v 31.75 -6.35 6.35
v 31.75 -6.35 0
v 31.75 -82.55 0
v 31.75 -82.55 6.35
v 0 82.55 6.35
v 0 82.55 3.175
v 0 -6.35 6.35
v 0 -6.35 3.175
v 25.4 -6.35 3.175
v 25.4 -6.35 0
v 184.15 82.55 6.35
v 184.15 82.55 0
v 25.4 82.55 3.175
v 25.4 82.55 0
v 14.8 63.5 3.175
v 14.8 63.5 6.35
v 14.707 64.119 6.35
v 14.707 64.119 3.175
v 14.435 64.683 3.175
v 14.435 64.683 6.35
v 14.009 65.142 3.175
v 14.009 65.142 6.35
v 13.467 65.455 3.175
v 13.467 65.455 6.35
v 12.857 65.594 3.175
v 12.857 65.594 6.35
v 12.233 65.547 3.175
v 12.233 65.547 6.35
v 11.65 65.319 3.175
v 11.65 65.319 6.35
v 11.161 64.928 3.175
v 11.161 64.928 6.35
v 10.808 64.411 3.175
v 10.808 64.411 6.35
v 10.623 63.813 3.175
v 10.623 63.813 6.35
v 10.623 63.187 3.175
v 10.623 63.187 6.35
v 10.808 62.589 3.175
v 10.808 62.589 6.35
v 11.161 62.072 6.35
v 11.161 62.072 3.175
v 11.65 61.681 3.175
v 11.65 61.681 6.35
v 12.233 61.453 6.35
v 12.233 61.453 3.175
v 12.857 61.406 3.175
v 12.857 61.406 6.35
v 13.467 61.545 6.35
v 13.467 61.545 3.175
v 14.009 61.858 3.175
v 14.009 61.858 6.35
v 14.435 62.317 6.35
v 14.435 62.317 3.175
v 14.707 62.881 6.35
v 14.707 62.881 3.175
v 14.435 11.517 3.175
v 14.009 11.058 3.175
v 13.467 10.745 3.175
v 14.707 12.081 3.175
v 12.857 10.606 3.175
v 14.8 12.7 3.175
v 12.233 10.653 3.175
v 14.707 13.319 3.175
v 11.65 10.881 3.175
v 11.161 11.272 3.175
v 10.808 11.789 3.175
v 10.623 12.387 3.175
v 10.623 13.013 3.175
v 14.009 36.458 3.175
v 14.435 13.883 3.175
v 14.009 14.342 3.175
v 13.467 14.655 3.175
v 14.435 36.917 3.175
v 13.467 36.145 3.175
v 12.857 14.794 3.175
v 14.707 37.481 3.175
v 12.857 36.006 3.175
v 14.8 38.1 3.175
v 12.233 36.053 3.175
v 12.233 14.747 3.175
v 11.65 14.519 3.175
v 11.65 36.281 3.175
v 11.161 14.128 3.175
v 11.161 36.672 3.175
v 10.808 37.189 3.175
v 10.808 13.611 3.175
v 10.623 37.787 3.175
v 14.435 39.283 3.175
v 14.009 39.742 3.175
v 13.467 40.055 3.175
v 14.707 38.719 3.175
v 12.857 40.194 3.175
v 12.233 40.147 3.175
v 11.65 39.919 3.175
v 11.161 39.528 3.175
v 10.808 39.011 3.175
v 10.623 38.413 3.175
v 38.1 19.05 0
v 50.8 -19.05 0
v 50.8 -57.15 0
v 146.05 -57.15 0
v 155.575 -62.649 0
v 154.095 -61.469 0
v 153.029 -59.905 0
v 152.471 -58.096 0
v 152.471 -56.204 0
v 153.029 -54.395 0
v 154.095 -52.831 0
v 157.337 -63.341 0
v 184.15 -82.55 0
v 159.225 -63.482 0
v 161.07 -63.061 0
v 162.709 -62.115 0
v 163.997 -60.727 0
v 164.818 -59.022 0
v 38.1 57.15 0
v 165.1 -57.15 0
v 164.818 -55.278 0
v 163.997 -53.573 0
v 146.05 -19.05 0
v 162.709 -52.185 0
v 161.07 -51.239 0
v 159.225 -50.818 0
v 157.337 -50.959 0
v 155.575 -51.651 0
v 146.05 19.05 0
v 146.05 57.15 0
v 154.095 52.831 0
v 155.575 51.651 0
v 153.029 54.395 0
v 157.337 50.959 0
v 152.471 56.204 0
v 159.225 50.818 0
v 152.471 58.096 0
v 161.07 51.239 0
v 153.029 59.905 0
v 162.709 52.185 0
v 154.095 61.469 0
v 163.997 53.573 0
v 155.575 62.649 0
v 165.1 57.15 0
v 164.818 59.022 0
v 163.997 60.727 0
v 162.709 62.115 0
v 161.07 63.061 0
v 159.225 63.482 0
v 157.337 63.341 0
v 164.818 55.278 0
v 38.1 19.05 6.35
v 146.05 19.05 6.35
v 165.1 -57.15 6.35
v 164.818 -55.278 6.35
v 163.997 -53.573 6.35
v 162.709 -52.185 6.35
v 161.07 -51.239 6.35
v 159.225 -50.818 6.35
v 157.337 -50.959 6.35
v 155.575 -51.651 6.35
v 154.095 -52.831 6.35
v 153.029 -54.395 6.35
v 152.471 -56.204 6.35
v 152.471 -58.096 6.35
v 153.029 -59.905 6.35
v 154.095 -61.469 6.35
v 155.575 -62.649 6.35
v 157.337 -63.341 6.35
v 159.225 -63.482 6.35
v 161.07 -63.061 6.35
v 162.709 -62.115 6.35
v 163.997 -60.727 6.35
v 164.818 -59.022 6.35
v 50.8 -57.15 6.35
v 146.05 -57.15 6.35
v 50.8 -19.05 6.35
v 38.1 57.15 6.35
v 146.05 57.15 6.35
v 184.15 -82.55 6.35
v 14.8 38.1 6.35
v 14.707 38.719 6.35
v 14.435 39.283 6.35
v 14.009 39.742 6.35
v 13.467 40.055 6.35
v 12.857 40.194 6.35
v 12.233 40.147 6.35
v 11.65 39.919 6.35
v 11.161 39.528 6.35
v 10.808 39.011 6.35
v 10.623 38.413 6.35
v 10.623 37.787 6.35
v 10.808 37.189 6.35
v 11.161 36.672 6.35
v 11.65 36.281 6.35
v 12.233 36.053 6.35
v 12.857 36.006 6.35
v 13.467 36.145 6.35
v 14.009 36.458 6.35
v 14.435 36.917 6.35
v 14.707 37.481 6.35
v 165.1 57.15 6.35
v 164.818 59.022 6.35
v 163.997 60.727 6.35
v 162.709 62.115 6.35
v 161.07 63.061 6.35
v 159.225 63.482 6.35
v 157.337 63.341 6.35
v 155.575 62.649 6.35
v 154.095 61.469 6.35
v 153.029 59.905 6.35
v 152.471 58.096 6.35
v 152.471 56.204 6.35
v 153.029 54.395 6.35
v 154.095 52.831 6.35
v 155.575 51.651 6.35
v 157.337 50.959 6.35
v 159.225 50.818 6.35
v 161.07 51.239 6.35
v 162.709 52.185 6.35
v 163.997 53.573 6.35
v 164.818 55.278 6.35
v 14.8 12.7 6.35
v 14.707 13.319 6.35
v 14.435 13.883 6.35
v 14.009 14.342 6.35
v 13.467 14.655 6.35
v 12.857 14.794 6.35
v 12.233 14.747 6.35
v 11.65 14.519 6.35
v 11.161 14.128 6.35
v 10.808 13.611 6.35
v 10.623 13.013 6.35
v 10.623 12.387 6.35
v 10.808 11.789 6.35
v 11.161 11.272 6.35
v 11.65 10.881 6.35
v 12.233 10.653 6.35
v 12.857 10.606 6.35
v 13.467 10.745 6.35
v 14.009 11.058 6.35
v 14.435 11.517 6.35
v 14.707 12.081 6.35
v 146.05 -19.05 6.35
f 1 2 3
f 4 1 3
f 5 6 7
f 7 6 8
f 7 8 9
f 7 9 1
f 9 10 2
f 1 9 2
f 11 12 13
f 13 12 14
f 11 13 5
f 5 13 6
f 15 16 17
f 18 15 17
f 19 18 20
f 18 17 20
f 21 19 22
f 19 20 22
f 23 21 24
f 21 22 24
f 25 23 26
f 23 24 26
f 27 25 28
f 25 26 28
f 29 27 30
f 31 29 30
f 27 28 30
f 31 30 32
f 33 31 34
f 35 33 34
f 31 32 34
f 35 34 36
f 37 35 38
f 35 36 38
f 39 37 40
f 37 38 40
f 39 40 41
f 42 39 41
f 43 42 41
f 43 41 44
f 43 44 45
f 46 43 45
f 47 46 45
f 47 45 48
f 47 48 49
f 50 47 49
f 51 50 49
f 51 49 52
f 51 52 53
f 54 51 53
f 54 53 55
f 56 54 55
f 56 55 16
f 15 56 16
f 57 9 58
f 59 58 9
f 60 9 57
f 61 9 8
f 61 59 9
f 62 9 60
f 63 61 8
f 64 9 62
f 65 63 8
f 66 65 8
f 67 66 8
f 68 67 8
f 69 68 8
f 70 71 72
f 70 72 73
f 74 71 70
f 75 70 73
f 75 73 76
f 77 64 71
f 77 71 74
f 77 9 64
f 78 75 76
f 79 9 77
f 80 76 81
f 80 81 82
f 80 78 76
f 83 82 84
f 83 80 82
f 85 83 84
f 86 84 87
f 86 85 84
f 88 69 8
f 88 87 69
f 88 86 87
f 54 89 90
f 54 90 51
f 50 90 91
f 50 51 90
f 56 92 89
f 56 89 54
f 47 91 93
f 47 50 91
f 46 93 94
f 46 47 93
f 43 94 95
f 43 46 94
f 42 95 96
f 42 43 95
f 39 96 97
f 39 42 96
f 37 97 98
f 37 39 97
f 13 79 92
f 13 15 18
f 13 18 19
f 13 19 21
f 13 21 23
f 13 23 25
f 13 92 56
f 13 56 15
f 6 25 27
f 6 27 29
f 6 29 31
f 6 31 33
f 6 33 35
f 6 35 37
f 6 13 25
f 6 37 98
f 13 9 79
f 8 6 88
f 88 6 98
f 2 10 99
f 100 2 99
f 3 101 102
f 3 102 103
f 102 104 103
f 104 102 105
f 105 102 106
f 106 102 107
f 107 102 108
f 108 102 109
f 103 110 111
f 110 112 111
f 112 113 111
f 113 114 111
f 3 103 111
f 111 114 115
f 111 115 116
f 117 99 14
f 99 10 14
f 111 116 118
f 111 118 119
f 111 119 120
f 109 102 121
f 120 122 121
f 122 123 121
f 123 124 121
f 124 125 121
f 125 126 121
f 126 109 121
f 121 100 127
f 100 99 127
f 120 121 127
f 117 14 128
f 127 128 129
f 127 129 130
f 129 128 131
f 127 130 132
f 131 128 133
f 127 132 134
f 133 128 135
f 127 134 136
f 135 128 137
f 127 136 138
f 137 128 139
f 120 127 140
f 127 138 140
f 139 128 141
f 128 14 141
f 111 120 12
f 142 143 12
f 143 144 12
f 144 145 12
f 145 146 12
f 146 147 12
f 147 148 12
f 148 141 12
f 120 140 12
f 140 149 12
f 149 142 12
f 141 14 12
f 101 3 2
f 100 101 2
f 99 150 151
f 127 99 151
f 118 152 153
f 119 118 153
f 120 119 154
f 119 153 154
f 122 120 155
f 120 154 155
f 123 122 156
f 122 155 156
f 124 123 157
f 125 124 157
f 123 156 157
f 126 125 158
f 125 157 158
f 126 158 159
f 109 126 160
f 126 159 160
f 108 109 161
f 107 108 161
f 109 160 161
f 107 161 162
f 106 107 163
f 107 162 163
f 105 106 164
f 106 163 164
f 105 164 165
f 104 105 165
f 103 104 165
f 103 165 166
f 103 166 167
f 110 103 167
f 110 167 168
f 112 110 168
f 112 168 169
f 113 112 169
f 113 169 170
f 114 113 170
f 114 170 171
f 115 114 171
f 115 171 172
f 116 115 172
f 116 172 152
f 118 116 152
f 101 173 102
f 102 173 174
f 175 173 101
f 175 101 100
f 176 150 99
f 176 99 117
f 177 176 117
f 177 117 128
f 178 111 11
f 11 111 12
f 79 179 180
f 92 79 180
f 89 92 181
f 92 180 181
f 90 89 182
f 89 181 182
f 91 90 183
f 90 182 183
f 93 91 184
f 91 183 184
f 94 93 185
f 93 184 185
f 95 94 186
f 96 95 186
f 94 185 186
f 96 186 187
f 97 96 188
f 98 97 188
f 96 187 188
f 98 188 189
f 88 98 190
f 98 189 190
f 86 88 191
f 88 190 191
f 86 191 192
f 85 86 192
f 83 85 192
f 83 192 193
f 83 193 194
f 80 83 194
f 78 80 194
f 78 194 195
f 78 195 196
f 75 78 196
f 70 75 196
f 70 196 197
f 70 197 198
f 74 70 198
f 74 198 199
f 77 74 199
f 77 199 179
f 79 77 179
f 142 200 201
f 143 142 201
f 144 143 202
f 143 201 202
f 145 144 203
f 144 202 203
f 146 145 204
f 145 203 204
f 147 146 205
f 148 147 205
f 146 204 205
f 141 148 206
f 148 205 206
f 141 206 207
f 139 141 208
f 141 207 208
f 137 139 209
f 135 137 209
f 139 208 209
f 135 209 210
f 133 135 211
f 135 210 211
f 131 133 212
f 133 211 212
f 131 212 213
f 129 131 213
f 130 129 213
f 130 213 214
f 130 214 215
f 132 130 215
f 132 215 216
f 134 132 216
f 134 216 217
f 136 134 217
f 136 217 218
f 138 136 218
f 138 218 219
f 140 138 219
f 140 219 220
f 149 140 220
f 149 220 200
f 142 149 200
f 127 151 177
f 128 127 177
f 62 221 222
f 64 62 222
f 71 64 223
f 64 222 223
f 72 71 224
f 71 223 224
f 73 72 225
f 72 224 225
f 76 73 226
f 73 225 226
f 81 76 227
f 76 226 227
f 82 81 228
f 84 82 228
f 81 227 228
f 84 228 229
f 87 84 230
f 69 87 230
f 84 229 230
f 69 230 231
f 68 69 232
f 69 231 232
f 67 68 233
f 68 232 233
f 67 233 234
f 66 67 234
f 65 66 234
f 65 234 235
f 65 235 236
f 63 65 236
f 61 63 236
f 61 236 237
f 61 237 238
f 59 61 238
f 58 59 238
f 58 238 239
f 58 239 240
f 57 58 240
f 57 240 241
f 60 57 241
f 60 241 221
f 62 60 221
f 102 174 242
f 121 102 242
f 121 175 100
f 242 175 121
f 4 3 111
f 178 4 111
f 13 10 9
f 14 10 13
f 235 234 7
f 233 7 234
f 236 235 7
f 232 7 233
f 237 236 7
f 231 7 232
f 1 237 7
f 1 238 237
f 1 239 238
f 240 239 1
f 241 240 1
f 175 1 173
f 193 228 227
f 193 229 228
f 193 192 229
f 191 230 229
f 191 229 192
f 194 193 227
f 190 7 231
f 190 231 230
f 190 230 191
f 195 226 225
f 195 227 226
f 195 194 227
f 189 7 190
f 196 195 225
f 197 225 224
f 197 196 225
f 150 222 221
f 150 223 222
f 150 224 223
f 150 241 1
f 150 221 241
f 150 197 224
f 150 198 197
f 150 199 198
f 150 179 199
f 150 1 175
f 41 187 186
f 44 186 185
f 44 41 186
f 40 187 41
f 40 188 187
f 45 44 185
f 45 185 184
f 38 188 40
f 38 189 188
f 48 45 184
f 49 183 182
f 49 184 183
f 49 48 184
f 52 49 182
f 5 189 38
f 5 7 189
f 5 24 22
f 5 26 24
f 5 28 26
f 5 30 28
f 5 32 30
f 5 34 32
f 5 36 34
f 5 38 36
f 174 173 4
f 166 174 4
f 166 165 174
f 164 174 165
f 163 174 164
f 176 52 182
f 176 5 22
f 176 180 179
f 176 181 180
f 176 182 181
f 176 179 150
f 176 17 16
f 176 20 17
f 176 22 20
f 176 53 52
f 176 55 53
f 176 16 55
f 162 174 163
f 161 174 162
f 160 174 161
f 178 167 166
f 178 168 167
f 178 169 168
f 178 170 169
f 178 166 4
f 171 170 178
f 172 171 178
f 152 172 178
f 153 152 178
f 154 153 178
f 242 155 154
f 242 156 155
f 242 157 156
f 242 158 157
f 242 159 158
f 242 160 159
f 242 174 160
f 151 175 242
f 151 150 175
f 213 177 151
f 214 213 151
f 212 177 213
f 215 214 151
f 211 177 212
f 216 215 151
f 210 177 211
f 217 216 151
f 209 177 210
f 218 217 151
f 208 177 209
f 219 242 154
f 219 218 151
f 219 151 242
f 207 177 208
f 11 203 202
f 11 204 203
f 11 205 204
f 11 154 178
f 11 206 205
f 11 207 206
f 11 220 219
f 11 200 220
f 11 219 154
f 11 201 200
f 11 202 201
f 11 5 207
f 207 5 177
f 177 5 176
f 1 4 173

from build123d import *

# Parameters (mm, degrees)
BOSS_EXTRUDE1_DEPTH       = 6.35
SKETCH5_R                 = 6.35
CUT_EXTRUDE1_DEPTH        = 202.906036314
SKETCH6_W                 = 95.25
SKETCH6_H                 = 38.1
SKETCH6_W_2               = 107.95
CUT_EXTRUDE2_DEPTH        = 10.16
SKETCH7_W                 = 25.4
SKETCH7_H                 = 88.9
CUT_EXTRUDE3_DEPTH        = 3.175
M5X0_8_TAPPED_HOLE1_D     = 4.2
M5X0_8_TAPPED_HOLE1_DEPTH = 13.97
M5X0_8_TAPPED_HOLE1_TIP   = 1.2618073


with BuildPart() as part:
    # Sketch2 → Boss-Extrude1 (new body)
    with BuildSketch(Plane.XY):
        Polygon((184.15, -82.55), (184.15, 82.55), (0, 82.55), (0, -6.35), (31.75, -6.35), (31.75, -82.55), align=None)
    extrude(amount=BOSS_EXTRUDE1_DEPTH)

    # Sketch5 → Cut-Extrude1 (cut, through all)
    with BuildSketch(Plane.XY.offset(6.35)):
        with Locations((-158.75, 57.15)):
            Circle(SKETCH5_R)
        with Locations((-158.75, -57.15)):
            Circle(SKETCH5_R)
        with Locations((158.75, 57.15)):
            Circle(SKETCH5_R)
        with Locations((158.75, -57.15)):
            Circle(SKETCH5_R)
    extrude(amount=-CUT_EXTRUDE1_DEPTH, mode=Mode.SUBTRACT)

    # Sketch6 → Cut-Extrude2 (cut)
    with BuildSketch(Plane.XY.offset(6.35)):
        with Locations((98.425, -38.1)):
            Rectangle(SKETCH6_W, SKETCH6_H)
        with Locations((92.075, 38.1)):
            Rectangle(SKETCH6_W_2, SKETCH6_H)
    extrude(amount=-CUT_EXTRUDE2_DEPTH, mode=Mode.SUBTRACT)

    # Sketch7 → Cut-Extrude3 (cut)
    with BuildSketch(Plane(origin=(0, 0, 0), x_dir=(-1, 0, 0), z_dir=(0, 0, -1))):
        with Locations((-12.7, 38.1)):
            Rectangle(SKETCH7_W, SKETCH7_H)
    extrude(amount=-CUT_EXTRUDE3_DEPTH, mode=Mode.SUBTRACT)

    # M5x0.8 Tapped Hole1
    with Locations(Plane(origin=(0, 0, 3.175), x_dir=(-1, 0, 0), z_dir=(0, 0, -1))):
        with Locations((-12.7, 38.1), (-12.7, 63.5), (-12.7, 12.7), (-2.670853236, 86.574215023)):
            Hole(M5X0_8_TAPPED_HOLE1_D / 2, depth=M5X0_8_TAPPED_HOLE1_DEPTH)
            with Locations((0, 0, -(M5X0_8_TAPPED_HOLE1_DEPTH + M5X0_8_TAPPED_HOLE1_TIP / 2))):  # 118° drill point
                Cone(0, M5X0_8_TAPPED_HOLE1_D / 2, M5X0_8_TAPPED_HOLE1_TIP, mode=Mode.SUBTRACT)


solid = part.part
